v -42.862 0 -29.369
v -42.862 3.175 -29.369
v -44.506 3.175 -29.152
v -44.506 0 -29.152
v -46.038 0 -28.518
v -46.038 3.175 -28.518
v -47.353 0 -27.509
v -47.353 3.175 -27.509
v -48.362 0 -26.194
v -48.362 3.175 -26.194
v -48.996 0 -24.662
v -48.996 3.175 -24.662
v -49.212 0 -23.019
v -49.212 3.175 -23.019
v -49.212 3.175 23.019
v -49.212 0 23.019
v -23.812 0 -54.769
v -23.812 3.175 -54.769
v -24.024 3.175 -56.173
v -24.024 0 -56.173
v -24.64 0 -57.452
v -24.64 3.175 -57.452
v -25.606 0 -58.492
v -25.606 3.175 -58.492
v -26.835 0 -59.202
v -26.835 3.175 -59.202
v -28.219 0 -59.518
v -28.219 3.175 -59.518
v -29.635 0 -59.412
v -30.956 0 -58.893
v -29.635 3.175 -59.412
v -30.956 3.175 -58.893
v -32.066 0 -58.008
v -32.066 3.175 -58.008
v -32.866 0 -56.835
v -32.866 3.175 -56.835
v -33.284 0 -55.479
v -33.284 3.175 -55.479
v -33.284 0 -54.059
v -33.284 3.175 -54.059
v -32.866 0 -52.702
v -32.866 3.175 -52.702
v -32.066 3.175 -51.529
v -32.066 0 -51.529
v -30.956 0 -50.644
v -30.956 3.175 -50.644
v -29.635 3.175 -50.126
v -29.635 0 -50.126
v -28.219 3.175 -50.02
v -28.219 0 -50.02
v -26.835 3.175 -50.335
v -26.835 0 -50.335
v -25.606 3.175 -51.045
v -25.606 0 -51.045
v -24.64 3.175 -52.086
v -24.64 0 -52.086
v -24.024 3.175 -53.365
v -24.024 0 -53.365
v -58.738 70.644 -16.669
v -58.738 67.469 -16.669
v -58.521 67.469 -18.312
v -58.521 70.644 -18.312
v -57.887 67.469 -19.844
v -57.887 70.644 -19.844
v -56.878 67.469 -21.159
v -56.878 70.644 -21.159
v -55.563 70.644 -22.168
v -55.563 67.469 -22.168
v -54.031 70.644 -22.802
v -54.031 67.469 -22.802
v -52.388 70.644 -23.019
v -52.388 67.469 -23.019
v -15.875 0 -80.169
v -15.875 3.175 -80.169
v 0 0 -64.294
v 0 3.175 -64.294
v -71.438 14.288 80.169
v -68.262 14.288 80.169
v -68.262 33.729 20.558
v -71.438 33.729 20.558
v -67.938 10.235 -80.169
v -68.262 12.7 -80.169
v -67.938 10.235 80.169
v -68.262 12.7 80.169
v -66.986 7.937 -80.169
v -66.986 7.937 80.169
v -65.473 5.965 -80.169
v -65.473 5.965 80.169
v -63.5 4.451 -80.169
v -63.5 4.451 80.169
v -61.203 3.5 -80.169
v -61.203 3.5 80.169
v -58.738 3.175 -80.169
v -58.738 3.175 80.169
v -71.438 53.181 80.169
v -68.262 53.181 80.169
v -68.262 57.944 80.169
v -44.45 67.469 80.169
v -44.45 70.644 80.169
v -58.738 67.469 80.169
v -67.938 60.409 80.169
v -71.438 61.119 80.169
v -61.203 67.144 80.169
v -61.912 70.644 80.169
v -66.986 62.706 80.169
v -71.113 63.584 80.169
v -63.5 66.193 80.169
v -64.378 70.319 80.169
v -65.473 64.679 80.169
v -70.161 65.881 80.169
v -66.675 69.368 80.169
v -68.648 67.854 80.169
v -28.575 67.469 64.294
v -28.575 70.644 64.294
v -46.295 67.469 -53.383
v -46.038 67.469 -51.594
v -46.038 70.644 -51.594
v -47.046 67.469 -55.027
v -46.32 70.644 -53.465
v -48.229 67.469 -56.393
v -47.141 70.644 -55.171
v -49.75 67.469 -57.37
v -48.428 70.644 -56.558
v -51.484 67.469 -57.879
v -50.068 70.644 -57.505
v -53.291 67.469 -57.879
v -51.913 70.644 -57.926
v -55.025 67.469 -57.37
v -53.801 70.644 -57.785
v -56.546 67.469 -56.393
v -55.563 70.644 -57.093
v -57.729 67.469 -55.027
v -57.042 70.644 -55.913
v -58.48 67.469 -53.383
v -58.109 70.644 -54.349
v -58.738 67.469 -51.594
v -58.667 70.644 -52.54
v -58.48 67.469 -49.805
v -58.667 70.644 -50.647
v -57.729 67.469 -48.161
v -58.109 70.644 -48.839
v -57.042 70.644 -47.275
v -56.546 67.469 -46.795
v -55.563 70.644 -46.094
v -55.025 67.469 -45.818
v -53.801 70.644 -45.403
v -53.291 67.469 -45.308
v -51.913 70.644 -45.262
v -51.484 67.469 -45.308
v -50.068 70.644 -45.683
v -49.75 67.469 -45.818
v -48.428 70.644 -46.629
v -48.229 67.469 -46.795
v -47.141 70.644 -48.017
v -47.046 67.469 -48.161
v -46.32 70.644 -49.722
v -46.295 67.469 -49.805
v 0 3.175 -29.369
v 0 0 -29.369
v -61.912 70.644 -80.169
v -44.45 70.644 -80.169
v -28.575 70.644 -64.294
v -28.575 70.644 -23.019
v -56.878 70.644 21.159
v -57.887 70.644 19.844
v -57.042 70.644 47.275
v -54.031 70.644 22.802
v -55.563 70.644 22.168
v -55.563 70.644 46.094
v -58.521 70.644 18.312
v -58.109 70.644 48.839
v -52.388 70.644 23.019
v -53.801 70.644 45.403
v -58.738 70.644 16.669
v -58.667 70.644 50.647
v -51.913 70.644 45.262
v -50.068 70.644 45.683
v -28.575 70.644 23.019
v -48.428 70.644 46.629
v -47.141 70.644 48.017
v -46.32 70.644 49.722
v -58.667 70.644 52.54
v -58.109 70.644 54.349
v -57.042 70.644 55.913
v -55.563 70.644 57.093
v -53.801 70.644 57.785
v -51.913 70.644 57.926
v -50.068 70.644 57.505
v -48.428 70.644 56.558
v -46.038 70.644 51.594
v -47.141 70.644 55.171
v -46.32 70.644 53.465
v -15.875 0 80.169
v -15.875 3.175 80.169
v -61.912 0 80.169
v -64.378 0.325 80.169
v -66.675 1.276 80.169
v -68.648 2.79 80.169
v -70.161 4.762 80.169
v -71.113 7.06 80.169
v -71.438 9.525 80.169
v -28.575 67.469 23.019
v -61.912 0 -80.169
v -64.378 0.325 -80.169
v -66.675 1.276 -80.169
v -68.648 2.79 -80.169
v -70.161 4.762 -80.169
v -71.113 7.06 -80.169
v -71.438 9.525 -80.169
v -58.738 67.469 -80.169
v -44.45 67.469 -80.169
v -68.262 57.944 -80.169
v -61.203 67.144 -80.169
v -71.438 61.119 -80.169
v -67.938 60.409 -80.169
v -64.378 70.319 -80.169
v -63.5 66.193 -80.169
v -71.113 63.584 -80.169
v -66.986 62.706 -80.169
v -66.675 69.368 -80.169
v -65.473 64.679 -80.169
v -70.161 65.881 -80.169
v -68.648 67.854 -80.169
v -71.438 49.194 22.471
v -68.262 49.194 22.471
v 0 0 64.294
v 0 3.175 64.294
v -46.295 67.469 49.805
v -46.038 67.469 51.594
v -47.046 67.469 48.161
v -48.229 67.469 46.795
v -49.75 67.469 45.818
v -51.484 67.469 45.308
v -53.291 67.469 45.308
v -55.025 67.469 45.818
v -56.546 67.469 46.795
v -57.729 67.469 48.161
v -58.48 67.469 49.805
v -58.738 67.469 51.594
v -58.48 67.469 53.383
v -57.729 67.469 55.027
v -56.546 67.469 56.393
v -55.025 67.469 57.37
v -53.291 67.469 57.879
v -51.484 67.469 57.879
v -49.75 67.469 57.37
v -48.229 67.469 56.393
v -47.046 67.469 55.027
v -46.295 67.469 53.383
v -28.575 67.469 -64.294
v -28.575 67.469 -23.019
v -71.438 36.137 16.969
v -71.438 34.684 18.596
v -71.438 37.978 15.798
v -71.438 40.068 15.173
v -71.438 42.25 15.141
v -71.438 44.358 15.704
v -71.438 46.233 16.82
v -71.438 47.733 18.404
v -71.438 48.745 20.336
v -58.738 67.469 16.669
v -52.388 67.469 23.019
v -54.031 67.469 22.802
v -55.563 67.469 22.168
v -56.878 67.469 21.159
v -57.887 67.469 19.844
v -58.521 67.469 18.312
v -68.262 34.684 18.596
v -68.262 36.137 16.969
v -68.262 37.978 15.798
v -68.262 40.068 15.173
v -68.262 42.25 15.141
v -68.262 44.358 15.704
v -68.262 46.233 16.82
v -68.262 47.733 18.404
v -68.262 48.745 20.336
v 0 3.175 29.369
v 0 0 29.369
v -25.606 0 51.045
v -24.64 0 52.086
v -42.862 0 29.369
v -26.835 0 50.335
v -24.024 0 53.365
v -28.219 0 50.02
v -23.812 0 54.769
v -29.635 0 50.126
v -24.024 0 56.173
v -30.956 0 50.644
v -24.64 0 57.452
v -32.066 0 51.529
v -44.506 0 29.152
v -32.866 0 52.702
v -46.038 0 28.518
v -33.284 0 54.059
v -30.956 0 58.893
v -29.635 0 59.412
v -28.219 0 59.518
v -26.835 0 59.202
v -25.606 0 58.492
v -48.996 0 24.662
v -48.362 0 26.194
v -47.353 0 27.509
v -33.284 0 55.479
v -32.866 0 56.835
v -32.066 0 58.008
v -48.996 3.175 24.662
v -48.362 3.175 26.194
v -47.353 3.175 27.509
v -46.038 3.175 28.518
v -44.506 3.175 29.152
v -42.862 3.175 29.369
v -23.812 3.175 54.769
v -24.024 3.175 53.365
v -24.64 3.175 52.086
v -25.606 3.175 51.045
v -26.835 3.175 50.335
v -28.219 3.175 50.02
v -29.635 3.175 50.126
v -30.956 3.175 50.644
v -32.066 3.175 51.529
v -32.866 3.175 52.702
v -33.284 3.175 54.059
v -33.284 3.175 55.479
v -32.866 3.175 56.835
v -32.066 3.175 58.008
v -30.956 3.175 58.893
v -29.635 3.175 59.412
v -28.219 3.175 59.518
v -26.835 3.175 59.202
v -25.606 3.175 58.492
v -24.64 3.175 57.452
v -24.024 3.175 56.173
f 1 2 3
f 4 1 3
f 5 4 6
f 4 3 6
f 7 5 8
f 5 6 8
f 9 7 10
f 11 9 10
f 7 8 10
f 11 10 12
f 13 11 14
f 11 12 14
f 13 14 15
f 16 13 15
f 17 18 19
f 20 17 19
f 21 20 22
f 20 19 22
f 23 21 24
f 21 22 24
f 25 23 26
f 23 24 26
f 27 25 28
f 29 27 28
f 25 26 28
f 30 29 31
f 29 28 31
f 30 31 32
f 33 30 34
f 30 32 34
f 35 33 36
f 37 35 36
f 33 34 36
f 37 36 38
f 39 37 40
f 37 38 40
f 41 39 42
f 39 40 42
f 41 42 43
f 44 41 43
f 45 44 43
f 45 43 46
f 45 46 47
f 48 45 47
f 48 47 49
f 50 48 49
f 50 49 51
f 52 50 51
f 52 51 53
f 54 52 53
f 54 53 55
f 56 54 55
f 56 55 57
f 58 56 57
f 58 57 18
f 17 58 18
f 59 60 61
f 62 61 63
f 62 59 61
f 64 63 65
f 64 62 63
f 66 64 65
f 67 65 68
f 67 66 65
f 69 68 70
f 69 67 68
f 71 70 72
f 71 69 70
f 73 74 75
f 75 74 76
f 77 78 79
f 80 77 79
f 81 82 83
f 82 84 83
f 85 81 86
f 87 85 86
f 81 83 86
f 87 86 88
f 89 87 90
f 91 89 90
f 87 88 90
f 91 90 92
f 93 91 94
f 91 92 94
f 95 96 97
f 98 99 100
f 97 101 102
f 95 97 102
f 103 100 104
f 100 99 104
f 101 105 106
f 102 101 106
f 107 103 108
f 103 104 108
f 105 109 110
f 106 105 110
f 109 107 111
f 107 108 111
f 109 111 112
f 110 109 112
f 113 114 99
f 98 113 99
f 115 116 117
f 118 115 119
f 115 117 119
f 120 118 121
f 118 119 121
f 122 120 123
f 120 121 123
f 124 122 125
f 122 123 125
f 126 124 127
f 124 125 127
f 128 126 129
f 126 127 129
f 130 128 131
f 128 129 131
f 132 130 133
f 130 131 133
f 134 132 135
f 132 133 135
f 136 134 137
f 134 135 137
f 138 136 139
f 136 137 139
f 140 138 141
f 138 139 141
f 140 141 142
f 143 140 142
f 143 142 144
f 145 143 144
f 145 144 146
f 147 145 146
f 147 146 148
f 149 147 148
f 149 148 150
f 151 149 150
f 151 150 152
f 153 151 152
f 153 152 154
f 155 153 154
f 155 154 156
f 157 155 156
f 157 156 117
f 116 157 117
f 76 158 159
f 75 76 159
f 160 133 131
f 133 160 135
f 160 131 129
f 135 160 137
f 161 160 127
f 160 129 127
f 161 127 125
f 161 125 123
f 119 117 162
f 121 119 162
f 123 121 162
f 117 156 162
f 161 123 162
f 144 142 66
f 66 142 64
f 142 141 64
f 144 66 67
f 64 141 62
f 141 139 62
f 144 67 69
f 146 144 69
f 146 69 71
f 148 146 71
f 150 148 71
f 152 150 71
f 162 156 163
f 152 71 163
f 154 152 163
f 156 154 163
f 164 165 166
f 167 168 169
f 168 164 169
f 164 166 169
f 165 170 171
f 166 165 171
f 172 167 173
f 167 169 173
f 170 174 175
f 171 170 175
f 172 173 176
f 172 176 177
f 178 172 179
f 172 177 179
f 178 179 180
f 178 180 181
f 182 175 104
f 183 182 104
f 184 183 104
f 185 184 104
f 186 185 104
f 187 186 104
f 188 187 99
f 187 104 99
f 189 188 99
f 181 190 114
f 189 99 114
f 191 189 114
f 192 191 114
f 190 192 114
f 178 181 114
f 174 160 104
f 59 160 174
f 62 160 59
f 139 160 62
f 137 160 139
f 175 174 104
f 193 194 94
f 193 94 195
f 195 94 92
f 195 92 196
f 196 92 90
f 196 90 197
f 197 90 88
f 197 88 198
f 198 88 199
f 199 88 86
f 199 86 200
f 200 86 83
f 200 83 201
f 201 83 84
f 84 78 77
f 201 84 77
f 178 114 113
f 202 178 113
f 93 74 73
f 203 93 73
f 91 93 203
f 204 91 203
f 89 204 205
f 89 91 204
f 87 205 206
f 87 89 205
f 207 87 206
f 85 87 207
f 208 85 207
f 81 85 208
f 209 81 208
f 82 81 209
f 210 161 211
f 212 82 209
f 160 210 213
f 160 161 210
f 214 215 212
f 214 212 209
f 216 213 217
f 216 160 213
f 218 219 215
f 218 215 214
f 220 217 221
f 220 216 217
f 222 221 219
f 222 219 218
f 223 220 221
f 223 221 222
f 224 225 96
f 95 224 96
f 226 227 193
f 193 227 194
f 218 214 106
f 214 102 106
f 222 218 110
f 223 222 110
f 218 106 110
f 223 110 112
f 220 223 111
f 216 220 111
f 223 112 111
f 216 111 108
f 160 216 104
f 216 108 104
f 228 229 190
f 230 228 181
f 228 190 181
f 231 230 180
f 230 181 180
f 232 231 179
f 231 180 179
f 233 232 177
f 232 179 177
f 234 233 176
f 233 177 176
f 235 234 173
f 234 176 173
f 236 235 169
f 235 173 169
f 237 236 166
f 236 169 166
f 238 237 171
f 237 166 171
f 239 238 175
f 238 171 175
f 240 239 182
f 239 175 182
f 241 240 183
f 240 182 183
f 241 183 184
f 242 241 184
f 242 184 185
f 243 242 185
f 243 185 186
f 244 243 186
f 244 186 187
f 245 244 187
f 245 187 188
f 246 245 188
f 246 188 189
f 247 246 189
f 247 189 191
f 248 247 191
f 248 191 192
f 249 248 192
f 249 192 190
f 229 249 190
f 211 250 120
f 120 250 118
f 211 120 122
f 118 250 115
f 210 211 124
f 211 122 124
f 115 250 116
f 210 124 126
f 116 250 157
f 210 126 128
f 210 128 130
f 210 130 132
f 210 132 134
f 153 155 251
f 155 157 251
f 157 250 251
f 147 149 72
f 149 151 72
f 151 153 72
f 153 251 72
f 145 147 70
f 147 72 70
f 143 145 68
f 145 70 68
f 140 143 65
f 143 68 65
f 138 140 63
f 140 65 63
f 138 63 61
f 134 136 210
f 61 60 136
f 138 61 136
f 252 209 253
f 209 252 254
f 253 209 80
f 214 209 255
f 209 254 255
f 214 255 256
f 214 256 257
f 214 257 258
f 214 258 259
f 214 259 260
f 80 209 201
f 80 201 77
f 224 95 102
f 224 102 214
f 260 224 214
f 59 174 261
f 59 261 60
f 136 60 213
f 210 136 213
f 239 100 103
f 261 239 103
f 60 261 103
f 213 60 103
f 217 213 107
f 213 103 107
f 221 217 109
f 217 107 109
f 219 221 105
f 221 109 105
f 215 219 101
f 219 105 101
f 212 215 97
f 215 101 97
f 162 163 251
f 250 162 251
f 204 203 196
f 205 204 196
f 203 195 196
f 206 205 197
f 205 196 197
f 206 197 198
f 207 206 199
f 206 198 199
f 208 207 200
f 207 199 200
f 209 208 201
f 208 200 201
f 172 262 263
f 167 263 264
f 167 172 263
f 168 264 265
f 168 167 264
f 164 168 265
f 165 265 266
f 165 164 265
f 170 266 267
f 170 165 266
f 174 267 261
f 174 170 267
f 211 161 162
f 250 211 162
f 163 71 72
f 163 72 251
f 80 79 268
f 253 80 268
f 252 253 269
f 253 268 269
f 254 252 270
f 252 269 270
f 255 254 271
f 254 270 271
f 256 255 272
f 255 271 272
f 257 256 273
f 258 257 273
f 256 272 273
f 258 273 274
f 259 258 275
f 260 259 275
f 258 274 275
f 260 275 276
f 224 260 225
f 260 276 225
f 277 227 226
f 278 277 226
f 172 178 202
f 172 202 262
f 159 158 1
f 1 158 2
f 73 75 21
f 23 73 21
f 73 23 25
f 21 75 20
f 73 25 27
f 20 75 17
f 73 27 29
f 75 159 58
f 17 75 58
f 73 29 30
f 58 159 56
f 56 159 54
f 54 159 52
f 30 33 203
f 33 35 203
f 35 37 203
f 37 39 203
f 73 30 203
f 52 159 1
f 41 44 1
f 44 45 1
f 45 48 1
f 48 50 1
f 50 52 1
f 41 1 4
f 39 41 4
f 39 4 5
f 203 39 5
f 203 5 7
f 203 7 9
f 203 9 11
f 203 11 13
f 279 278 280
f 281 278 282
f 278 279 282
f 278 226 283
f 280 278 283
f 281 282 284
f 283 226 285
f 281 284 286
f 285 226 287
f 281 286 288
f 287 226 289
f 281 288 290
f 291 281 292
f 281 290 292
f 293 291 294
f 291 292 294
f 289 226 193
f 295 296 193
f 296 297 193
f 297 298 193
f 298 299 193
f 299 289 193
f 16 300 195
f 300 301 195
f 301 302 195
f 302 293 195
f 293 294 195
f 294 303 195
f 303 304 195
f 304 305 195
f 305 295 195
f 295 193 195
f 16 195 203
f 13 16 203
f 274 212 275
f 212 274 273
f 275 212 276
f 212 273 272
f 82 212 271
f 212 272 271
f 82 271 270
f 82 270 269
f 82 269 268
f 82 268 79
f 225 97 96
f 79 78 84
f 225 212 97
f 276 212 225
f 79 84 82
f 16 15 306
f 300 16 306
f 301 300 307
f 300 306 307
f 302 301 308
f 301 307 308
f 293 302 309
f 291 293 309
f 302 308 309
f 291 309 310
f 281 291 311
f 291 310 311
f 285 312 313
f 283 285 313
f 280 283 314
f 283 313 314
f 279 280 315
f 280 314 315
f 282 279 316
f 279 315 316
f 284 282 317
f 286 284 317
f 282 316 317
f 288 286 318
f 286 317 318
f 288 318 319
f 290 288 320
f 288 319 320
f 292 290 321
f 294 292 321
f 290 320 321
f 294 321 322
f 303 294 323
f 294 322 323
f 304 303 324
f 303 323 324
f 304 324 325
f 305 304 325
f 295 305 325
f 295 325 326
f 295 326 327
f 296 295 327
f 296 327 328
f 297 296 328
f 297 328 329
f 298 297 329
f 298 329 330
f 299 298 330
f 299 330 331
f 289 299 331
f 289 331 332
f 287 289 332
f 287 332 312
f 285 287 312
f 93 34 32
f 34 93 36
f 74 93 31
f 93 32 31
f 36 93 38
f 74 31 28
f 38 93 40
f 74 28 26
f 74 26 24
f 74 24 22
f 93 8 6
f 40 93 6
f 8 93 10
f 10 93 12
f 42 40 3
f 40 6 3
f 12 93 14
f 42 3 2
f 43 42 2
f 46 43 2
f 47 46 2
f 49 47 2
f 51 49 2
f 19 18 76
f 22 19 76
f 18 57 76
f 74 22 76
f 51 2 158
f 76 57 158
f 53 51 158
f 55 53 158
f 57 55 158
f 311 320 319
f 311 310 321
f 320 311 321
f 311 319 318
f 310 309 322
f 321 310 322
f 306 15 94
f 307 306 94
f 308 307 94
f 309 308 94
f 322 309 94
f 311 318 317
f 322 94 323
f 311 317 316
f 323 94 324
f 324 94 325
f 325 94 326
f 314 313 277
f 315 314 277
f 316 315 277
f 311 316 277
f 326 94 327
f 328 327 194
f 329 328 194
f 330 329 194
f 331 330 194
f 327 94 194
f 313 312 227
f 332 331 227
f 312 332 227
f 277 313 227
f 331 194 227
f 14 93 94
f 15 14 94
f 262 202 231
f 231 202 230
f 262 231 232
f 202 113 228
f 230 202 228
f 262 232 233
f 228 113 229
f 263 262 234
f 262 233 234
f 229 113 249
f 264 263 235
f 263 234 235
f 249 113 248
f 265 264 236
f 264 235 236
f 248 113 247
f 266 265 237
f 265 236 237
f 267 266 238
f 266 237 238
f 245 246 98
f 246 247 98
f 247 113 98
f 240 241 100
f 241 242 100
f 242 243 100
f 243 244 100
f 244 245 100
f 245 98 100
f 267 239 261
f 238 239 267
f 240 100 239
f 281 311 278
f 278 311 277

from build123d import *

# Parameters (mm, degrees)
BOSS_EXTRUDE1_DEPTH = 80.16875
CUT_EXTRUDE2_DEPTH  = 4.175
CUT_EXTRUDE3_REACH  = 72.644
SKETCH3_R           = 6.35
CUT_EXTRUDE4_REACH  = 5.175
SKETCH4_R           = 4.7625


with BuildPart() as part:
    # Sketch1 → Boss-Extrude1 (new body, symmetric)
    with BuildSketch(Plane.XY):
        with BuildLine():
            Line((0, 0), (-61.9125, 0))
            ThreePointArc((-61.9125, 0), (-68.647692091, 2.789807909), (-71.4375, 9.525))
            Line((-71.4375, 9.525), (-71.4375, 61.11875))
            ThreePointArc((-71.4375, 61.11875), (-68.647692091, 67.853942091), (-61.9125, 70.64375))
            Line((-61.9125, 70.64375), (-28.575, 70.64375))
            Line((-28.575, 70.64375), (-28.575, 67.46875))
            Line((-28.575, 67.46875), (-58.7375, 67.46875))
            ThreePointArc((-58.7375, 67.46875), (-65.472692091, 64.678942091), (-68.2625, 57.94375))
            Line((-68.2625, 57.94375), (-68.2625, 12.7))
            ThreePointArc((-68.2625, 12.7), (-65.472692091, 5.964807909), (-58.7375, 3.175))
            Line((-58.7375, 3.175), (0, 3.175))
            Line((0, 3.175), (0, 0))
        make_face()
    extrude(amount=BOSS_EXTRUDE1_DEPTH, both=True)

    # Sketch2 → Cut-Extrude2 (cut, through all)
    with BuildSketch(Plane(origin=(-68.2625, 0, 0), x_dir=(0, 0, -1), z_dir=(1, 0, 0))):
        with BuildLine():
            Line((-22.471470052, 49.193610415), (-80.16875, 53.18125))
            Line((-80.16875, 53.18125), (-80.16875, 14.2875))
            Line((-80.16875, 14.2875), (-20.557643239, 33.728685684))
            ThreePointArc((-20.557643239, 33.728685684), (-15.141341042, 42.249850944), (-22.471470052, 49.193610415))
        make_face()
    extrude(amount=-CUT_EXTRUDE2_DEPTH, mode=Mode.SUBTRACT)

    # Sketch3 → Cut-Extrude3 (cut, up to next)
    with BuildSketch(Plane(origin=(0, 70.64375, 0), x_dir=(1, 0, 0), z_dir=(0, 1, 0)), mode=Mode.PRIVATE) as cut_extrude3_sk1:
        with Locations((-52.3875, 51.59375)):
            Circle(SKETCH3_R)
    cut_extrude3_tool1 = extrude(cut_extrude3_sk1.sketch, amount=-CUT_EXTRUDE3_REACH, mode=Mode.PRIVATE) & part.part
    add(cut_extrude3_tool1.solids().sort_by_distance((-52.3875, 70.64375, -51.59375))[0], mode=Mode.SUBTRACT)
    # Sketch3 → Cut-Extrude3 (cut, up to next)
    with BuildSketch(Plane(origin=(0, 70.64375, 0), x_dir=(1, 0, 0), z_dir=(0, 1, 0)), mode=Mode.PRIVATE) as cut_extrude3_sk2:
        with Locations((-52.3875, -51.59375)):
            Circle(SKETCH3_R)
    cut_extrude3_tool2 = extrude(cut_extrude3_sk2.sketch, amount=-CUT_EXTRUDE3_REACH, mode=Mode.PRIVATE) & part.part
    add(cut_extrude3_tool2.solids().sort_by_distance((-52.3875, 70.64375, 51.59375))[0], mode=Mode.SUBTRACT)
    # Sketch3 → Cut-Extrude3 (cut, up to next)
    with BuildSketch(Plane(origin=(0, 70.64375, 0), x_dir=(1, 0, 0), z_dir=(0, 1, 0)), mode=Mode.PRIVATE) as cut_extrude3_sk3:
        Polygon((-44.45, 80.16875), (-28.575, 64.29375), (-28.575, 80.16875), align=None)
    cut_extrude3_tool3 = extrude(cut_extrude3_sk3.sketch, amount=-CUT_EXTRUDE3_REACH, mode=Mode.PRIVATE) & part.part
    add(cut_extrude3_tool3.solids().sort_by_distance((-33.866667, 70.64375, -74.877083))[0], mode=Mode.SUBTRACT)
    # Sketch3 → Cut-Extrude3 (cut, up to next)
    with BuildSketch(Plane(origin=(0, 70.64375, 0), x_dir=(1, 0, 0), z_dir=(0, 1, 0)), mode=Mode.PRIVATE) as cut_extrude3_sk4:
        Polygon((-28.575, -80.16875), (-28.575, -64.29375), (-44.45, -80.16875), align=None)
    cut_extrude3_tool4 = extrude(cut_extrude3_sk4.sketch, amount=-CUT_EXTRUDE3_REACH, mode=Mode.PRIVATE) & part.part
    add(cut_extrude3_tool4.solids().sort_by_distance((-33.866667, 70.64375, 74.877083))[0], mode=Mode.SUBTRACT)
    # Sketch3 → Cut-Extrude3 (cut, up to next)
    with BuildSketch(Plane(origin=(0, 70.64375, 0), x_dir=(1, 0, 0), z_dir=(0, 1, 0)), mode=Mode.PRIVATE) as cut_extrude3_sk5:
        Polygon((-15.875, 80.16875), (0, 64.29375), (0, 80.16875), align=None)
    cut_extrude3_tool5 = extrude(cut_extrude3_sk5.sketch, amount=-CUT_EXTRUDE3_REACH, mode=Mode.PRIVATE) & part.part
    add(cut_extrude3_tool5.solids().sort_by_distance((-5.291667, 70.64375, -74.877083))[0], mode=Mode.SUBTRACT)
    # Sketch3 → Cut-Extrude3 (cut, up to next)
    with BuildSketch(Plane(origin=(0, 70.64375, 0), x_dir=(1, 0, 0), z_dir=(0, 1, 0)), mode=Mode.PRIVATE) as cut_extrude3_sk6:
        Polygon((-15.875, -80.16875), (0, -80.16875), (0, -64.29375), align=None)
    cut_extrude3_tool6 = extrude(cut_extrude3_sk6.sketch, amount=-CUT_EXTRUDE3_REACH, mode=Mode.PRIVATE) & part.part
    add(cut_extrude3_tool6.solids().sort_by_distance((-5.291667, 70.64375, 74.877083))[0], mode=Mode.SUBTRACT)
    # Sketch3 → Cut-Extrude3 (cut, up to next)
    with BuildSketch(Plane(origin=(0, 70.64375, 0), x_dir=(1, 0, 0), z_dir=(0, 1, 0)), mode=Mode.PRIVATE) as cut_extrude3_sk7:
        with BuildLine():
            Line((-28.575, 23.01875), (-28.575, -23.01875))
            Line((-28.575, -23.01875), (-52.3875, -23.01875))
            ThreePointArc((-52.3875, -23.01875), (-56.877628061, -21.158878061), (-58.7375, -16.66875))
            Line((-58.7375, -16.66875), (-58.7375, 16.66875))
            ThreePointArc((-58.7375, 16.66875), (-56.877628061, 21.158878061), (-52.3875, 23.01875))
            Line((-52.3875, 23.01875), (-28.575, 23.01875))
        make_face()
    cut_extrude3_tool7 = extrude(cut_extrude3_sk7.sketch, amount=-CUT_EXTRUDE3_REACH, mode=Mode.PRIVATE) & part.part
    add(cut_extrude3_tool7.solids().sort_by_distance((-43.483817, 70.64375, 0))[0], mode=Mode.SUBTRACT)

    # Sketch4 → Cut-Extrude4 (cut, up to next)
    with BuildSketch(Plane(origin=(0, 3.175, 0), x_dir=(1, 0, 0), z_dir=(0, 1, 0)), mode=Mode.PRIVATE) as cut_extrude4_sk1:
        with Locations((-28.575, 54.76875)):
            Circle(SKETCH4_R)
    cut_extrude4_tool1 = extrude(cut_extrude4_sk1.sketch, amount=-CUT_EXTRUDE4_REACH, mode=Mode.PRIVATE) & part.part
    add(cut_extrude4_tool1.solids().sort_by_distance((-28.575, 3.175, -54.76875))[0], mode=Mode.SUBTRACT)
    # Sketch4 → Cut-Extrude4 (cut, up to next)
    with BuildSketch(Plane(origin=(0, 3.175, 0), x_dir=(1, 0, 0), z_dir=(0, 1, 0)), mode=Mode.PRIVATE) as cut_extrude4_sk2:
        with Locations((-28.575, -54.76875)):
            Circle(SKETCH4_R)
    cut_extrude4_tool2 = extrude(cut_extrude4_sk2.sketch, amount=-CUT_EXTRUDE4_REACH, mode=Mode.PRIVATE) & part.part
    add(cut_extrude4_tool2.solids().sort_by_distance((-28.575, 3.175, 54.76875))[0], mode=Mode.SUBTRACT)
    # Sketch4 → Cut-Extrude4 (cut, up to next)
    with BuildSketch(Plane(origin=(0, 3.175, 0), x_dir=(1, 0, 0), z_dir=(0, 1, 0)), mode=Mode.PRIVATE) as cut_extrude4_sk3:
        with BuildLine():
            Line((0, 29.36875), (-42.8625, 29.36875))
            ThreePointArc((-42.8625, 29.36875), (-47.352628061, 27.508878061), (-49.2125, 23.01875))
            Line((-49.2125, 23.01875), (-49.2125, -23.01875))
            ThreePointArc((-49.2125, -23.01875), (-47.352628061, -27.508878061), (-42.8625, -29.36875))
            Line((-42.8625, -29.36875), (0, -29.36875))
            Line((0, -29.36875), (0, 29.36875))
        make_face()
    cut_extrude4_tool3 = extrude(cut_extrude4_sk3.sketch, amount=-CUT_EXTRUDE4_REACH, mode=Mode.PRIVATE) & part.part
    add(cut_extrude4_tool3.solids().sort_by_distance((-24.466585, 3.175, 0))[0], mode=Mode.SUBTRACT)


solid = part.part
